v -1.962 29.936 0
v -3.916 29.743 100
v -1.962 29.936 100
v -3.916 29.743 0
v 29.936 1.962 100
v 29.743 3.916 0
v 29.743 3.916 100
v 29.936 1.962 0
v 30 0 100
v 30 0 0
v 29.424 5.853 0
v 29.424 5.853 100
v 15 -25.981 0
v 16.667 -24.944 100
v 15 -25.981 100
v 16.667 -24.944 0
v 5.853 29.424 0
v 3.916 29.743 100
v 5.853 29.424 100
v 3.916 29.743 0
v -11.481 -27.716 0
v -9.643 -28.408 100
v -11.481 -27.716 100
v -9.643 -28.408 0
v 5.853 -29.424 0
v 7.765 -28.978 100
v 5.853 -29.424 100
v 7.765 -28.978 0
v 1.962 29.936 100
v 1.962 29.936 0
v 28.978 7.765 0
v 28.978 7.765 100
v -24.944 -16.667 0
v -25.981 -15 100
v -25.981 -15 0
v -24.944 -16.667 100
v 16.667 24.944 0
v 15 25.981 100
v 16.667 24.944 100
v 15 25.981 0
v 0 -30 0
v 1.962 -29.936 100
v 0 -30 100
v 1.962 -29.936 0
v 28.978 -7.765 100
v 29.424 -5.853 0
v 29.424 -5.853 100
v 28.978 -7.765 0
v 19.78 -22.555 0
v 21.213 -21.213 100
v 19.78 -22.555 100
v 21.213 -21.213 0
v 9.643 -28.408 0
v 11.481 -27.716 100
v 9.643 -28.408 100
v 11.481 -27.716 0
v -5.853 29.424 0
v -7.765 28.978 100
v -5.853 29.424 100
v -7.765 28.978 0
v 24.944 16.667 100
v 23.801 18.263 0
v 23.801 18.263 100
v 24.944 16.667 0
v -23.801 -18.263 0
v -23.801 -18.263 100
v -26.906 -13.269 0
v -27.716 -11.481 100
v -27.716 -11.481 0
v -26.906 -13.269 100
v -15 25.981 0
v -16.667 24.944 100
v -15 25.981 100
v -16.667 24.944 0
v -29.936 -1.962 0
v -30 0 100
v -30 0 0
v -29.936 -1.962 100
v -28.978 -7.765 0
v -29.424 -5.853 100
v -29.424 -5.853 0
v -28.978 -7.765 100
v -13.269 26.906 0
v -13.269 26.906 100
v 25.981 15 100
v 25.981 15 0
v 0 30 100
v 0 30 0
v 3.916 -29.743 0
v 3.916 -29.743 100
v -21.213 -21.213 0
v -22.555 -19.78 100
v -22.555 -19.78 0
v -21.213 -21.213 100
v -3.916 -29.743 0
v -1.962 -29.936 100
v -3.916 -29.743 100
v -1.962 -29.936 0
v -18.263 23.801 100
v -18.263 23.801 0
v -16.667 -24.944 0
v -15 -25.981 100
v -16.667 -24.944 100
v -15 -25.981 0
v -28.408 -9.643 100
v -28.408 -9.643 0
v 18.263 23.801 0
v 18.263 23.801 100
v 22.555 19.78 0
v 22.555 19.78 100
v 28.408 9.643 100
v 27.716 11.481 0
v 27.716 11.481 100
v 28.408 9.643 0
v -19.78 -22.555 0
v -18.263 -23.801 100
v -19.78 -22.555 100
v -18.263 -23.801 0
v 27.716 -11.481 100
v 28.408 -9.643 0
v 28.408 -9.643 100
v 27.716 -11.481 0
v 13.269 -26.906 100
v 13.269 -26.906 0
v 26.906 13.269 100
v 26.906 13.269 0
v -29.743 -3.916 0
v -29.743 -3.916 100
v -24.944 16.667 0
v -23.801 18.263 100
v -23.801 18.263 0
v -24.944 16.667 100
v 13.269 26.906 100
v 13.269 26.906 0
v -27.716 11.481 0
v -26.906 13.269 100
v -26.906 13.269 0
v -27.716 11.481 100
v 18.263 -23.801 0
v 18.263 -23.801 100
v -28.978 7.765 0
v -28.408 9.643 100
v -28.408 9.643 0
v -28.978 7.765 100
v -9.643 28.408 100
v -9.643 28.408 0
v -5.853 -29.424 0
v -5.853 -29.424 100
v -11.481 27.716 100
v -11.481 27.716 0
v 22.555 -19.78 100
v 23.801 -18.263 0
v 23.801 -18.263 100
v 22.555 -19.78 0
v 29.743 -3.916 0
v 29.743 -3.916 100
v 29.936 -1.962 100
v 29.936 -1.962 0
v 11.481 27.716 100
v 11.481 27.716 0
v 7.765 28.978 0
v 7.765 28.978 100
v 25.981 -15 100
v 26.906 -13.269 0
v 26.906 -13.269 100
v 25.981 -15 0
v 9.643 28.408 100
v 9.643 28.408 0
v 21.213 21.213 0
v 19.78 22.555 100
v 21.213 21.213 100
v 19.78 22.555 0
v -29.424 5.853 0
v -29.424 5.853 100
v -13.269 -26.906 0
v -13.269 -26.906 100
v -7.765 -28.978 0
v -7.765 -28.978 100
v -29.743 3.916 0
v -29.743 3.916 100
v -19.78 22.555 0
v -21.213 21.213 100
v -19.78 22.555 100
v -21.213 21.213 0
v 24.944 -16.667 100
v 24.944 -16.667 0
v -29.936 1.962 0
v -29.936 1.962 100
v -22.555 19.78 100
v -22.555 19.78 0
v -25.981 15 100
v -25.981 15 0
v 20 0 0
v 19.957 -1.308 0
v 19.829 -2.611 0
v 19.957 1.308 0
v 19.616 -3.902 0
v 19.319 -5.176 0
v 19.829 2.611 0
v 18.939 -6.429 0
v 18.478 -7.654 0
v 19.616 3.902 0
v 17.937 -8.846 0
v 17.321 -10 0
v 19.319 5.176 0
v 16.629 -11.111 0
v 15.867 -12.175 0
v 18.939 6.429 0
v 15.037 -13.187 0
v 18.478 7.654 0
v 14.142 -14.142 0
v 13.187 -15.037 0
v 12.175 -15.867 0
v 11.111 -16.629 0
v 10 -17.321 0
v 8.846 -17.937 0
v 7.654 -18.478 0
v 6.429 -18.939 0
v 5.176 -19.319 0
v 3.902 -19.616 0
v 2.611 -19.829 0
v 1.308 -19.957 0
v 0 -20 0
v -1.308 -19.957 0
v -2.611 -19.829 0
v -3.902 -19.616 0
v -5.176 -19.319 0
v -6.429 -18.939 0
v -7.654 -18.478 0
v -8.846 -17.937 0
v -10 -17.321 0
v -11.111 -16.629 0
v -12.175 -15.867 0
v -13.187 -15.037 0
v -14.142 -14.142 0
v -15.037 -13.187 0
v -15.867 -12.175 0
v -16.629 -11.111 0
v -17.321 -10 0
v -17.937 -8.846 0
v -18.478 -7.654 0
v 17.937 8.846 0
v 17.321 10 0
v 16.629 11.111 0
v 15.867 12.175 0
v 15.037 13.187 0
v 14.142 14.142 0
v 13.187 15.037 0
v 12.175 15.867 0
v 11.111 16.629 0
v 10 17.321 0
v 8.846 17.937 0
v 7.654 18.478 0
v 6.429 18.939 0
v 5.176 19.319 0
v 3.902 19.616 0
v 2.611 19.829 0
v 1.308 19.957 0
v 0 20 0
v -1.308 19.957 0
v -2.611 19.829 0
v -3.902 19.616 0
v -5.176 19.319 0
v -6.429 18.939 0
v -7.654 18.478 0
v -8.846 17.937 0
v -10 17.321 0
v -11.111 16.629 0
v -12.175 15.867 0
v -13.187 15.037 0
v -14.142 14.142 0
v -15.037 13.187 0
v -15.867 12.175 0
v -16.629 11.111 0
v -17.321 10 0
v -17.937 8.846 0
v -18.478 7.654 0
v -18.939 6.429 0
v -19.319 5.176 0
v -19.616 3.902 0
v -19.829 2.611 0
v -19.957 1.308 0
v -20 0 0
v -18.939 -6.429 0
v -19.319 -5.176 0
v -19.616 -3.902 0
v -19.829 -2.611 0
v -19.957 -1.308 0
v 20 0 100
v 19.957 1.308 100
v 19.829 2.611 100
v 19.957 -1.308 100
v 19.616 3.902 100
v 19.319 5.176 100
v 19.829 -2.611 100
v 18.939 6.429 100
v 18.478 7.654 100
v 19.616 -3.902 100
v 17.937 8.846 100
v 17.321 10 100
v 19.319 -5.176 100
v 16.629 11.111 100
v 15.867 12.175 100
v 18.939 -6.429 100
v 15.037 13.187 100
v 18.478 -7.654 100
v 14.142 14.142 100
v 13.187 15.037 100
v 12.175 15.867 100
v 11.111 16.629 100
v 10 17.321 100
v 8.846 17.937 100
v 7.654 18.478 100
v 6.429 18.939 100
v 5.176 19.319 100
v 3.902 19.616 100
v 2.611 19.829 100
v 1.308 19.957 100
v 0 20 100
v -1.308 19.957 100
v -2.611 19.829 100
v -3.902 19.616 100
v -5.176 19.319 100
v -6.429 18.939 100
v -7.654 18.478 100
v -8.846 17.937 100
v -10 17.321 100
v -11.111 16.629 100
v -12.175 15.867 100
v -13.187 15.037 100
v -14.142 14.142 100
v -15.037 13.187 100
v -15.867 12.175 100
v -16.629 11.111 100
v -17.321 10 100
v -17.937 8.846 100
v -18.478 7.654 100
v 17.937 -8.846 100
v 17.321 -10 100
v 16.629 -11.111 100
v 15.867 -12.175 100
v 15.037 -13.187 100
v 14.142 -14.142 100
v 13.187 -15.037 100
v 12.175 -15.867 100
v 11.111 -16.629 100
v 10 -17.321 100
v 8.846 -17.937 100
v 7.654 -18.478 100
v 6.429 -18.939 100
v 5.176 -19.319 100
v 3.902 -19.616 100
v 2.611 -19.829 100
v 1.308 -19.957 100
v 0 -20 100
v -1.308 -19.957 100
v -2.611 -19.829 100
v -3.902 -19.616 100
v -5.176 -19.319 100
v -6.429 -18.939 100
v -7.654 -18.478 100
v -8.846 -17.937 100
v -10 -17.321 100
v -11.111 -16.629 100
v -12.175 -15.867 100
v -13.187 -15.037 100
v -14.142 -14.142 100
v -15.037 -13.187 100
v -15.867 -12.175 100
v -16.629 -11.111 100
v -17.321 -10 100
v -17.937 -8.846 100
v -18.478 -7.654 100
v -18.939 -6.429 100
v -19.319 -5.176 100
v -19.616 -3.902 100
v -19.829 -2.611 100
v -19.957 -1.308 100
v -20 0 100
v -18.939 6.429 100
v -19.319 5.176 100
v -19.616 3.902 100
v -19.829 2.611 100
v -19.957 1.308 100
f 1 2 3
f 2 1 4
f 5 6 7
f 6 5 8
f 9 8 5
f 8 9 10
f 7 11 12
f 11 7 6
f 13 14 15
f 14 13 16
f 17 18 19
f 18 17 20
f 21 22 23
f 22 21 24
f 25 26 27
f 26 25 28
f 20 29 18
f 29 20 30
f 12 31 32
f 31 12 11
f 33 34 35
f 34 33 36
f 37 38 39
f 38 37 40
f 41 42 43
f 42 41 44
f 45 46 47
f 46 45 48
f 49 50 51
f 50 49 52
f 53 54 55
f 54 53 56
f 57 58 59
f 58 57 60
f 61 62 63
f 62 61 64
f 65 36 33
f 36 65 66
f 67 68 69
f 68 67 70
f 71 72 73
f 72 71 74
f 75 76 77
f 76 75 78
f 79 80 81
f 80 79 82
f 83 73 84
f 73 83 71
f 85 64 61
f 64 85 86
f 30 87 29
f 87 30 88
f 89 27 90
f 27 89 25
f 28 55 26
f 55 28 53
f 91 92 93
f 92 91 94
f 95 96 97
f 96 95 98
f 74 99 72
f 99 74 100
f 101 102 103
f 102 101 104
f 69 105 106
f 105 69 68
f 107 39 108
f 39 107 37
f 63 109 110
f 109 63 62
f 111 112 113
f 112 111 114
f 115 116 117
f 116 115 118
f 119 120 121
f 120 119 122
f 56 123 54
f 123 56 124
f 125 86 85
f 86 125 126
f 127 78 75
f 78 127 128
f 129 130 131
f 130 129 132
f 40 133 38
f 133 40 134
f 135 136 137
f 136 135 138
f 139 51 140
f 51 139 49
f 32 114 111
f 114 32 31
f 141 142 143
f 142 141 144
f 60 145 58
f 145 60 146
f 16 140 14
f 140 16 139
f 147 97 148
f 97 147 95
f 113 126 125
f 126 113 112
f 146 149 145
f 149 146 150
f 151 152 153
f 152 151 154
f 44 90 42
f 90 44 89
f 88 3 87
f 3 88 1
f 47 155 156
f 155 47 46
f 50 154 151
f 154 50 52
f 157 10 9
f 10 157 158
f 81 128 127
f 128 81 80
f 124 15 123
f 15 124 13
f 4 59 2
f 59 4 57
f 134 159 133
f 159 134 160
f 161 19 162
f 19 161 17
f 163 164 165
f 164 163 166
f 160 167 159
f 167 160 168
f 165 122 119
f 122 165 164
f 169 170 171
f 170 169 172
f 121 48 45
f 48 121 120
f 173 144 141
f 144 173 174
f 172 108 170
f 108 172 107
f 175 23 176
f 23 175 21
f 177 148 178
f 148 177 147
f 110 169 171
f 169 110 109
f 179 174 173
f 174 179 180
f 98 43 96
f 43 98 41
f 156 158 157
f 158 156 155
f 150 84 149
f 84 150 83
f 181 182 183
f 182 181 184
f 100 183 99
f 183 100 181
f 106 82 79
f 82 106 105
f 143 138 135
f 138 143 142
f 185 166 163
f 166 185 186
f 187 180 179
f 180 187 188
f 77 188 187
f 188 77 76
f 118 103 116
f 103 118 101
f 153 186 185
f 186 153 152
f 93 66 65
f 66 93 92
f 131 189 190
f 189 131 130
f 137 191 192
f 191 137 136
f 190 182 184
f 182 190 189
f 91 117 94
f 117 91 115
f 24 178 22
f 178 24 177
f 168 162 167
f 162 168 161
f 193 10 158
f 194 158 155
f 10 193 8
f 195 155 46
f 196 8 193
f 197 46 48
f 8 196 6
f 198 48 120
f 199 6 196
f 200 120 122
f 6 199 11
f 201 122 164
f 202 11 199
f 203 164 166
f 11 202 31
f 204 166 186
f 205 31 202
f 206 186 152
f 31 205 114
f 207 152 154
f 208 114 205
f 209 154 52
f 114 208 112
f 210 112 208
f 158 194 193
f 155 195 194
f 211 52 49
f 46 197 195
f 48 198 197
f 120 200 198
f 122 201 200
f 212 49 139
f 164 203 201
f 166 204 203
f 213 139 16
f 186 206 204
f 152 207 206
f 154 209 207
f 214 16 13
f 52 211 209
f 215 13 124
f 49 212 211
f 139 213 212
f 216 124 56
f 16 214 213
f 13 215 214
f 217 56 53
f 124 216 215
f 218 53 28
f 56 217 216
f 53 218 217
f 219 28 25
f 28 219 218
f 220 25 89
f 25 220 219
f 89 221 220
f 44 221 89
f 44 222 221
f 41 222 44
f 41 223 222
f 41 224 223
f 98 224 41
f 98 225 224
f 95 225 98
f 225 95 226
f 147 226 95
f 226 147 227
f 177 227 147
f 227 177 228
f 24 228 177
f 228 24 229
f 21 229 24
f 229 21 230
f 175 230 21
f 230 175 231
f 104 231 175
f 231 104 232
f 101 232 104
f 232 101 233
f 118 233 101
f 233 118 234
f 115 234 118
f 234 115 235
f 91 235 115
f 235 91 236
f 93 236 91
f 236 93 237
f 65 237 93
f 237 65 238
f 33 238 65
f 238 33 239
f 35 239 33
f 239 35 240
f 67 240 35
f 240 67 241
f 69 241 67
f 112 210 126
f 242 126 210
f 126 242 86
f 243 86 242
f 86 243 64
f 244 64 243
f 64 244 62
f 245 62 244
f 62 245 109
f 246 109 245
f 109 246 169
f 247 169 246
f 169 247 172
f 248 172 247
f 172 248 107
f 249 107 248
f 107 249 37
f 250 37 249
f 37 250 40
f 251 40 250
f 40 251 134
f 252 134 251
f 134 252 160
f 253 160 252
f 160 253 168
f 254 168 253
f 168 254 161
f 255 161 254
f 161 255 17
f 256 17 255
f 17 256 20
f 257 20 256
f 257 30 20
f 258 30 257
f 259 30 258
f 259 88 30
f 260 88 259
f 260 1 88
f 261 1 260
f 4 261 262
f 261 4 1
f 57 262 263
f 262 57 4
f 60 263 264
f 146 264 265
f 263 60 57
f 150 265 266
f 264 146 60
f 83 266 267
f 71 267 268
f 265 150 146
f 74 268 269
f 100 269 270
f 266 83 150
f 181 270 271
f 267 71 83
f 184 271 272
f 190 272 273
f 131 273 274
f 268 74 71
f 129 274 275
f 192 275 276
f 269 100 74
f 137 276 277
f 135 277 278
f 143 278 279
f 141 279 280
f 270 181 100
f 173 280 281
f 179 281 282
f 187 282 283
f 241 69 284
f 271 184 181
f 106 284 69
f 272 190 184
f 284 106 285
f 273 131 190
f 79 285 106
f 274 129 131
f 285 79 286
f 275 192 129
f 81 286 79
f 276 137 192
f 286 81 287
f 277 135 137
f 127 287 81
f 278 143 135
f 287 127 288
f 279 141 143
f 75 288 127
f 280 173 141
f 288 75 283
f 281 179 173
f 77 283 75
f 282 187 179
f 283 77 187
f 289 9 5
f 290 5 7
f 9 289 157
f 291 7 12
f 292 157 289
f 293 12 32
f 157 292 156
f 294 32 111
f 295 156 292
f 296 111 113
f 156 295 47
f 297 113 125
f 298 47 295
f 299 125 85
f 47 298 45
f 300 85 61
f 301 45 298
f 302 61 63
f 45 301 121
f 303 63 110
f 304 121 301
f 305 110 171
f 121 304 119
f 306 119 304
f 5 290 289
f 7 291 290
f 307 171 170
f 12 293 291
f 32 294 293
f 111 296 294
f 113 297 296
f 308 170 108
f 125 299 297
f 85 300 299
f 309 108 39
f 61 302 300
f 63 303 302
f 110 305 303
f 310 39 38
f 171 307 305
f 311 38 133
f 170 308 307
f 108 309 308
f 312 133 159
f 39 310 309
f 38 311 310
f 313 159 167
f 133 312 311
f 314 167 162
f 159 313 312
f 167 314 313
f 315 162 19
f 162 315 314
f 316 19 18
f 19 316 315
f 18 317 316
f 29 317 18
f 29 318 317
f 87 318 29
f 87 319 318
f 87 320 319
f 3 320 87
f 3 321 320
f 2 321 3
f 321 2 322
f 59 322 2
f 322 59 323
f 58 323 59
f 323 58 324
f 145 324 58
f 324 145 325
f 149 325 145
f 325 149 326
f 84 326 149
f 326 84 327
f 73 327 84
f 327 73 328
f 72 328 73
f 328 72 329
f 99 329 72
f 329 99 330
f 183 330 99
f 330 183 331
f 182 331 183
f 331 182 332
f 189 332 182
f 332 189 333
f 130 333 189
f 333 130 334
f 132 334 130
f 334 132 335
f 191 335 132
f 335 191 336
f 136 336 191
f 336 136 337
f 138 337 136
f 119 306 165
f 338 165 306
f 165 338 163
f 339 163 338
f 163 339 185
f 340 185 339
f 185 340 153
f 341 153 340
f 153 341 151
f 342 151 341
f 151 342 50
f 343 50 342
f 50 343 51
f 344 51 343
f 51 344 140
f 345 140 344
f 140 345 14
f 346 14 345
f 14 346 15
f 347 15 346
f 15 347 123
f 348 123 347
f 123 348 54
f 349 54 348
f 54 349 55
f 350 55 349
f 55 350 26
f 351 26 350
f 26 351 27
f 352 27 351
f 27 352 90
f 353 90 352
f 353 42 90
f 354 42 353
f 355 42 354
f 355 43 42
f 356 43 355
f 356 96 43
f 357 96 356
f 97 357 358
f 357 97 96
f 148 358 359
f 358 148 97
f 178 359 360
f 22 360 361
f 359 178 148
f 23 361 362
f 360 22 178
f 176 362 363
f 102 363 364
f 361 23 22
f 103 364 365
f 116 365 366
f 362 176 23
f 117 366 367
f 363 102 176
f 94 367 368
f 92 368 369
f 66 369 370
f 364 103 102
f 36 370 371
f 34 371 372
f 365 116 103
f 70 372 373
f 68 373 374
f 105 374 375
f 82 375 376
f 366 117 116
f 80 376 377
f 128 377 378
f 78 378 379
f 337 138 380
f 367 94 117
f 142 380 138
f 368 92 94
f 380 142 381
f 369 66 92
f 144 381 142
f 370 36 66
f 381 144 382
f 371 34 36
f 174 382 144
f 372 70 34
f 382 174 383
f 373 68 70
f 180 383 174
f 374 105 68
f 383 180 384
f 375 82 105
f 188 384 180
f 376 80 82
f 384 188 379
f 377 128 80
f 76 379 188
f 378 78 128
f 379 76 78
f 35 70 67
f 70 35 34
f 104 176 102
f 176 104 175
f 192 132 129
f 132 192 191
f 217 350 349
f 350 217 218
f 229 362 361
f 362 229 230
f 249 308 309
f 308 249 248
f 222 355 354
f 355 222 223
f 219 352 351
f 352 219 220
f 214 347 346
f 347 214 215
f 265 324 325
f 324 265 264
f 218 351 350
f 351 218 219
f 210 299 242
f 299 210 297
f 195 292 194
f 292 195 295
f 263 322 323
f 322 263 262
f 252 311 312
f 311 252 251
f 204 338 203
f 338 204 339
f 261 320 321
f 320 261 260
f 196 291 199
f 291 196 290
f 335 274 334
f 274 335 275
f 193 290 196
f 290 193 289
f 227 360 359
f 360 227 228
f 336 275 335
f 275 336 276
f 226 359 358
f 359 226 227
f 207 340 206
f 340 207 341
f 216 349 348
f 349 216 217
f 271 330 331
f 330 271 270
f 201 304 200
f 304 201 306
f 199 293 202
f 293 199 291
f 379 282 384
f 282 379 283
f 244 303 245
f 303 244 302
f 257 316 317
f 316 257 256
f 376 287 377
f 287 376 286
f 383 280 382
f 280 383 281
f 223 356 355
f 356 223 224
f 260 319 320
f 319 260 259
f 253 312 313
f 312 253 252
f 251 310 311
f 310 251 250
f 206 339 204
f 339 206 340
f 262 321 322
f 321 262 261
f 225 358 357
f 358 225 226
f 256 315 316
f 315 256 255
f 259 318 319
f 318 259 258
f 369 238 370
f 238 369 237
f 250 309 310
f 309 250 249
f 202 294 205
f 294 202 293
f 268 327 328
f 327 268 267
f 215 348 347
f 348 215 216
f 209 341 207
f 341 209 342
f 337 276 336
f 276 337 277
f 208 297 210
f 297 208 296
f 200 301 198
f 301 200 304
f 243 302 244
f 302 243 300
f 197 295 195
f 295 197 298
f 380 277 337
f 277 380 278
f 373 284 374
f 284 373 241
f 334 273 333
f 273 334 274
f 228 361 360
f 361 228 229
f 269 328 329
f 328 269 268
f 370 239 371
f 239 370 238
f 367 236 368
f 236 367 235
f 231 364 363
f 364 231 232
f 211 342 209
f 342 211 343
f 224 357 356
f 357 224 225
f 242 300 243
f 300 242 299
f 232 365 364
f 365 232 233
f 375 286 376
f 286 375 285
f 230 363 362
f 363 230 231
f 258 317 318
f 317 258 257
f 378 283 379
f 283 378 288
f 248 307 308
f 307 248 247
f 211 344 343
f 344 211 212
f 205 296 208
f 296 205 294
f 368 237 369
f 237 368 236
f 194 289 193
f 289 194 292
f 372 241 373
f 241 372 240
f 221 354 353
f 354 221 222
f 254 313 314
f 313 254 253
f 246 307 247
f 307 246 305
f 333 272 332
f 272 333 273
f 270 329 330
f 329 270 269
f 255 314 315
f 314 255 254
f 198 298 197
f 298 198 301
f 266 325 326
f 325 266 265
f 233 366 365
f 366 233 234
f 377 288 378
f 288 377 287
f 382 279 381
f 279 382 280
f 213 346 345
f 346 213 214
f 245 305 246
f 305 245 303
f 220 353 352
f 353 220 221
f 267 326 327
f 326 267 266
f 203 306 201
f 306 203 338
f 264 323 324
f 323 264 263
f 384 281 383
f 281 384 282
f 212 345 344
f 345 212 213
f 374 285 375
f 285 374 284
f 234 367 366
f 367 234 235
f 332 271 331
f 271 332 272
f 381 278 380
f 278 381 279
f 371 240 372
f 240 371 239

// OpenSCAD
outer_radius = 30.0;
inner_radius = 20.0;
length = 100.0;
difference() {
  cylinder(r=outer_radius, h=length, $fn=96);
  translate([0, 0, -0.01]) cylinder(r=inner_radius, h=length + 0.02, $fn=96);
}
